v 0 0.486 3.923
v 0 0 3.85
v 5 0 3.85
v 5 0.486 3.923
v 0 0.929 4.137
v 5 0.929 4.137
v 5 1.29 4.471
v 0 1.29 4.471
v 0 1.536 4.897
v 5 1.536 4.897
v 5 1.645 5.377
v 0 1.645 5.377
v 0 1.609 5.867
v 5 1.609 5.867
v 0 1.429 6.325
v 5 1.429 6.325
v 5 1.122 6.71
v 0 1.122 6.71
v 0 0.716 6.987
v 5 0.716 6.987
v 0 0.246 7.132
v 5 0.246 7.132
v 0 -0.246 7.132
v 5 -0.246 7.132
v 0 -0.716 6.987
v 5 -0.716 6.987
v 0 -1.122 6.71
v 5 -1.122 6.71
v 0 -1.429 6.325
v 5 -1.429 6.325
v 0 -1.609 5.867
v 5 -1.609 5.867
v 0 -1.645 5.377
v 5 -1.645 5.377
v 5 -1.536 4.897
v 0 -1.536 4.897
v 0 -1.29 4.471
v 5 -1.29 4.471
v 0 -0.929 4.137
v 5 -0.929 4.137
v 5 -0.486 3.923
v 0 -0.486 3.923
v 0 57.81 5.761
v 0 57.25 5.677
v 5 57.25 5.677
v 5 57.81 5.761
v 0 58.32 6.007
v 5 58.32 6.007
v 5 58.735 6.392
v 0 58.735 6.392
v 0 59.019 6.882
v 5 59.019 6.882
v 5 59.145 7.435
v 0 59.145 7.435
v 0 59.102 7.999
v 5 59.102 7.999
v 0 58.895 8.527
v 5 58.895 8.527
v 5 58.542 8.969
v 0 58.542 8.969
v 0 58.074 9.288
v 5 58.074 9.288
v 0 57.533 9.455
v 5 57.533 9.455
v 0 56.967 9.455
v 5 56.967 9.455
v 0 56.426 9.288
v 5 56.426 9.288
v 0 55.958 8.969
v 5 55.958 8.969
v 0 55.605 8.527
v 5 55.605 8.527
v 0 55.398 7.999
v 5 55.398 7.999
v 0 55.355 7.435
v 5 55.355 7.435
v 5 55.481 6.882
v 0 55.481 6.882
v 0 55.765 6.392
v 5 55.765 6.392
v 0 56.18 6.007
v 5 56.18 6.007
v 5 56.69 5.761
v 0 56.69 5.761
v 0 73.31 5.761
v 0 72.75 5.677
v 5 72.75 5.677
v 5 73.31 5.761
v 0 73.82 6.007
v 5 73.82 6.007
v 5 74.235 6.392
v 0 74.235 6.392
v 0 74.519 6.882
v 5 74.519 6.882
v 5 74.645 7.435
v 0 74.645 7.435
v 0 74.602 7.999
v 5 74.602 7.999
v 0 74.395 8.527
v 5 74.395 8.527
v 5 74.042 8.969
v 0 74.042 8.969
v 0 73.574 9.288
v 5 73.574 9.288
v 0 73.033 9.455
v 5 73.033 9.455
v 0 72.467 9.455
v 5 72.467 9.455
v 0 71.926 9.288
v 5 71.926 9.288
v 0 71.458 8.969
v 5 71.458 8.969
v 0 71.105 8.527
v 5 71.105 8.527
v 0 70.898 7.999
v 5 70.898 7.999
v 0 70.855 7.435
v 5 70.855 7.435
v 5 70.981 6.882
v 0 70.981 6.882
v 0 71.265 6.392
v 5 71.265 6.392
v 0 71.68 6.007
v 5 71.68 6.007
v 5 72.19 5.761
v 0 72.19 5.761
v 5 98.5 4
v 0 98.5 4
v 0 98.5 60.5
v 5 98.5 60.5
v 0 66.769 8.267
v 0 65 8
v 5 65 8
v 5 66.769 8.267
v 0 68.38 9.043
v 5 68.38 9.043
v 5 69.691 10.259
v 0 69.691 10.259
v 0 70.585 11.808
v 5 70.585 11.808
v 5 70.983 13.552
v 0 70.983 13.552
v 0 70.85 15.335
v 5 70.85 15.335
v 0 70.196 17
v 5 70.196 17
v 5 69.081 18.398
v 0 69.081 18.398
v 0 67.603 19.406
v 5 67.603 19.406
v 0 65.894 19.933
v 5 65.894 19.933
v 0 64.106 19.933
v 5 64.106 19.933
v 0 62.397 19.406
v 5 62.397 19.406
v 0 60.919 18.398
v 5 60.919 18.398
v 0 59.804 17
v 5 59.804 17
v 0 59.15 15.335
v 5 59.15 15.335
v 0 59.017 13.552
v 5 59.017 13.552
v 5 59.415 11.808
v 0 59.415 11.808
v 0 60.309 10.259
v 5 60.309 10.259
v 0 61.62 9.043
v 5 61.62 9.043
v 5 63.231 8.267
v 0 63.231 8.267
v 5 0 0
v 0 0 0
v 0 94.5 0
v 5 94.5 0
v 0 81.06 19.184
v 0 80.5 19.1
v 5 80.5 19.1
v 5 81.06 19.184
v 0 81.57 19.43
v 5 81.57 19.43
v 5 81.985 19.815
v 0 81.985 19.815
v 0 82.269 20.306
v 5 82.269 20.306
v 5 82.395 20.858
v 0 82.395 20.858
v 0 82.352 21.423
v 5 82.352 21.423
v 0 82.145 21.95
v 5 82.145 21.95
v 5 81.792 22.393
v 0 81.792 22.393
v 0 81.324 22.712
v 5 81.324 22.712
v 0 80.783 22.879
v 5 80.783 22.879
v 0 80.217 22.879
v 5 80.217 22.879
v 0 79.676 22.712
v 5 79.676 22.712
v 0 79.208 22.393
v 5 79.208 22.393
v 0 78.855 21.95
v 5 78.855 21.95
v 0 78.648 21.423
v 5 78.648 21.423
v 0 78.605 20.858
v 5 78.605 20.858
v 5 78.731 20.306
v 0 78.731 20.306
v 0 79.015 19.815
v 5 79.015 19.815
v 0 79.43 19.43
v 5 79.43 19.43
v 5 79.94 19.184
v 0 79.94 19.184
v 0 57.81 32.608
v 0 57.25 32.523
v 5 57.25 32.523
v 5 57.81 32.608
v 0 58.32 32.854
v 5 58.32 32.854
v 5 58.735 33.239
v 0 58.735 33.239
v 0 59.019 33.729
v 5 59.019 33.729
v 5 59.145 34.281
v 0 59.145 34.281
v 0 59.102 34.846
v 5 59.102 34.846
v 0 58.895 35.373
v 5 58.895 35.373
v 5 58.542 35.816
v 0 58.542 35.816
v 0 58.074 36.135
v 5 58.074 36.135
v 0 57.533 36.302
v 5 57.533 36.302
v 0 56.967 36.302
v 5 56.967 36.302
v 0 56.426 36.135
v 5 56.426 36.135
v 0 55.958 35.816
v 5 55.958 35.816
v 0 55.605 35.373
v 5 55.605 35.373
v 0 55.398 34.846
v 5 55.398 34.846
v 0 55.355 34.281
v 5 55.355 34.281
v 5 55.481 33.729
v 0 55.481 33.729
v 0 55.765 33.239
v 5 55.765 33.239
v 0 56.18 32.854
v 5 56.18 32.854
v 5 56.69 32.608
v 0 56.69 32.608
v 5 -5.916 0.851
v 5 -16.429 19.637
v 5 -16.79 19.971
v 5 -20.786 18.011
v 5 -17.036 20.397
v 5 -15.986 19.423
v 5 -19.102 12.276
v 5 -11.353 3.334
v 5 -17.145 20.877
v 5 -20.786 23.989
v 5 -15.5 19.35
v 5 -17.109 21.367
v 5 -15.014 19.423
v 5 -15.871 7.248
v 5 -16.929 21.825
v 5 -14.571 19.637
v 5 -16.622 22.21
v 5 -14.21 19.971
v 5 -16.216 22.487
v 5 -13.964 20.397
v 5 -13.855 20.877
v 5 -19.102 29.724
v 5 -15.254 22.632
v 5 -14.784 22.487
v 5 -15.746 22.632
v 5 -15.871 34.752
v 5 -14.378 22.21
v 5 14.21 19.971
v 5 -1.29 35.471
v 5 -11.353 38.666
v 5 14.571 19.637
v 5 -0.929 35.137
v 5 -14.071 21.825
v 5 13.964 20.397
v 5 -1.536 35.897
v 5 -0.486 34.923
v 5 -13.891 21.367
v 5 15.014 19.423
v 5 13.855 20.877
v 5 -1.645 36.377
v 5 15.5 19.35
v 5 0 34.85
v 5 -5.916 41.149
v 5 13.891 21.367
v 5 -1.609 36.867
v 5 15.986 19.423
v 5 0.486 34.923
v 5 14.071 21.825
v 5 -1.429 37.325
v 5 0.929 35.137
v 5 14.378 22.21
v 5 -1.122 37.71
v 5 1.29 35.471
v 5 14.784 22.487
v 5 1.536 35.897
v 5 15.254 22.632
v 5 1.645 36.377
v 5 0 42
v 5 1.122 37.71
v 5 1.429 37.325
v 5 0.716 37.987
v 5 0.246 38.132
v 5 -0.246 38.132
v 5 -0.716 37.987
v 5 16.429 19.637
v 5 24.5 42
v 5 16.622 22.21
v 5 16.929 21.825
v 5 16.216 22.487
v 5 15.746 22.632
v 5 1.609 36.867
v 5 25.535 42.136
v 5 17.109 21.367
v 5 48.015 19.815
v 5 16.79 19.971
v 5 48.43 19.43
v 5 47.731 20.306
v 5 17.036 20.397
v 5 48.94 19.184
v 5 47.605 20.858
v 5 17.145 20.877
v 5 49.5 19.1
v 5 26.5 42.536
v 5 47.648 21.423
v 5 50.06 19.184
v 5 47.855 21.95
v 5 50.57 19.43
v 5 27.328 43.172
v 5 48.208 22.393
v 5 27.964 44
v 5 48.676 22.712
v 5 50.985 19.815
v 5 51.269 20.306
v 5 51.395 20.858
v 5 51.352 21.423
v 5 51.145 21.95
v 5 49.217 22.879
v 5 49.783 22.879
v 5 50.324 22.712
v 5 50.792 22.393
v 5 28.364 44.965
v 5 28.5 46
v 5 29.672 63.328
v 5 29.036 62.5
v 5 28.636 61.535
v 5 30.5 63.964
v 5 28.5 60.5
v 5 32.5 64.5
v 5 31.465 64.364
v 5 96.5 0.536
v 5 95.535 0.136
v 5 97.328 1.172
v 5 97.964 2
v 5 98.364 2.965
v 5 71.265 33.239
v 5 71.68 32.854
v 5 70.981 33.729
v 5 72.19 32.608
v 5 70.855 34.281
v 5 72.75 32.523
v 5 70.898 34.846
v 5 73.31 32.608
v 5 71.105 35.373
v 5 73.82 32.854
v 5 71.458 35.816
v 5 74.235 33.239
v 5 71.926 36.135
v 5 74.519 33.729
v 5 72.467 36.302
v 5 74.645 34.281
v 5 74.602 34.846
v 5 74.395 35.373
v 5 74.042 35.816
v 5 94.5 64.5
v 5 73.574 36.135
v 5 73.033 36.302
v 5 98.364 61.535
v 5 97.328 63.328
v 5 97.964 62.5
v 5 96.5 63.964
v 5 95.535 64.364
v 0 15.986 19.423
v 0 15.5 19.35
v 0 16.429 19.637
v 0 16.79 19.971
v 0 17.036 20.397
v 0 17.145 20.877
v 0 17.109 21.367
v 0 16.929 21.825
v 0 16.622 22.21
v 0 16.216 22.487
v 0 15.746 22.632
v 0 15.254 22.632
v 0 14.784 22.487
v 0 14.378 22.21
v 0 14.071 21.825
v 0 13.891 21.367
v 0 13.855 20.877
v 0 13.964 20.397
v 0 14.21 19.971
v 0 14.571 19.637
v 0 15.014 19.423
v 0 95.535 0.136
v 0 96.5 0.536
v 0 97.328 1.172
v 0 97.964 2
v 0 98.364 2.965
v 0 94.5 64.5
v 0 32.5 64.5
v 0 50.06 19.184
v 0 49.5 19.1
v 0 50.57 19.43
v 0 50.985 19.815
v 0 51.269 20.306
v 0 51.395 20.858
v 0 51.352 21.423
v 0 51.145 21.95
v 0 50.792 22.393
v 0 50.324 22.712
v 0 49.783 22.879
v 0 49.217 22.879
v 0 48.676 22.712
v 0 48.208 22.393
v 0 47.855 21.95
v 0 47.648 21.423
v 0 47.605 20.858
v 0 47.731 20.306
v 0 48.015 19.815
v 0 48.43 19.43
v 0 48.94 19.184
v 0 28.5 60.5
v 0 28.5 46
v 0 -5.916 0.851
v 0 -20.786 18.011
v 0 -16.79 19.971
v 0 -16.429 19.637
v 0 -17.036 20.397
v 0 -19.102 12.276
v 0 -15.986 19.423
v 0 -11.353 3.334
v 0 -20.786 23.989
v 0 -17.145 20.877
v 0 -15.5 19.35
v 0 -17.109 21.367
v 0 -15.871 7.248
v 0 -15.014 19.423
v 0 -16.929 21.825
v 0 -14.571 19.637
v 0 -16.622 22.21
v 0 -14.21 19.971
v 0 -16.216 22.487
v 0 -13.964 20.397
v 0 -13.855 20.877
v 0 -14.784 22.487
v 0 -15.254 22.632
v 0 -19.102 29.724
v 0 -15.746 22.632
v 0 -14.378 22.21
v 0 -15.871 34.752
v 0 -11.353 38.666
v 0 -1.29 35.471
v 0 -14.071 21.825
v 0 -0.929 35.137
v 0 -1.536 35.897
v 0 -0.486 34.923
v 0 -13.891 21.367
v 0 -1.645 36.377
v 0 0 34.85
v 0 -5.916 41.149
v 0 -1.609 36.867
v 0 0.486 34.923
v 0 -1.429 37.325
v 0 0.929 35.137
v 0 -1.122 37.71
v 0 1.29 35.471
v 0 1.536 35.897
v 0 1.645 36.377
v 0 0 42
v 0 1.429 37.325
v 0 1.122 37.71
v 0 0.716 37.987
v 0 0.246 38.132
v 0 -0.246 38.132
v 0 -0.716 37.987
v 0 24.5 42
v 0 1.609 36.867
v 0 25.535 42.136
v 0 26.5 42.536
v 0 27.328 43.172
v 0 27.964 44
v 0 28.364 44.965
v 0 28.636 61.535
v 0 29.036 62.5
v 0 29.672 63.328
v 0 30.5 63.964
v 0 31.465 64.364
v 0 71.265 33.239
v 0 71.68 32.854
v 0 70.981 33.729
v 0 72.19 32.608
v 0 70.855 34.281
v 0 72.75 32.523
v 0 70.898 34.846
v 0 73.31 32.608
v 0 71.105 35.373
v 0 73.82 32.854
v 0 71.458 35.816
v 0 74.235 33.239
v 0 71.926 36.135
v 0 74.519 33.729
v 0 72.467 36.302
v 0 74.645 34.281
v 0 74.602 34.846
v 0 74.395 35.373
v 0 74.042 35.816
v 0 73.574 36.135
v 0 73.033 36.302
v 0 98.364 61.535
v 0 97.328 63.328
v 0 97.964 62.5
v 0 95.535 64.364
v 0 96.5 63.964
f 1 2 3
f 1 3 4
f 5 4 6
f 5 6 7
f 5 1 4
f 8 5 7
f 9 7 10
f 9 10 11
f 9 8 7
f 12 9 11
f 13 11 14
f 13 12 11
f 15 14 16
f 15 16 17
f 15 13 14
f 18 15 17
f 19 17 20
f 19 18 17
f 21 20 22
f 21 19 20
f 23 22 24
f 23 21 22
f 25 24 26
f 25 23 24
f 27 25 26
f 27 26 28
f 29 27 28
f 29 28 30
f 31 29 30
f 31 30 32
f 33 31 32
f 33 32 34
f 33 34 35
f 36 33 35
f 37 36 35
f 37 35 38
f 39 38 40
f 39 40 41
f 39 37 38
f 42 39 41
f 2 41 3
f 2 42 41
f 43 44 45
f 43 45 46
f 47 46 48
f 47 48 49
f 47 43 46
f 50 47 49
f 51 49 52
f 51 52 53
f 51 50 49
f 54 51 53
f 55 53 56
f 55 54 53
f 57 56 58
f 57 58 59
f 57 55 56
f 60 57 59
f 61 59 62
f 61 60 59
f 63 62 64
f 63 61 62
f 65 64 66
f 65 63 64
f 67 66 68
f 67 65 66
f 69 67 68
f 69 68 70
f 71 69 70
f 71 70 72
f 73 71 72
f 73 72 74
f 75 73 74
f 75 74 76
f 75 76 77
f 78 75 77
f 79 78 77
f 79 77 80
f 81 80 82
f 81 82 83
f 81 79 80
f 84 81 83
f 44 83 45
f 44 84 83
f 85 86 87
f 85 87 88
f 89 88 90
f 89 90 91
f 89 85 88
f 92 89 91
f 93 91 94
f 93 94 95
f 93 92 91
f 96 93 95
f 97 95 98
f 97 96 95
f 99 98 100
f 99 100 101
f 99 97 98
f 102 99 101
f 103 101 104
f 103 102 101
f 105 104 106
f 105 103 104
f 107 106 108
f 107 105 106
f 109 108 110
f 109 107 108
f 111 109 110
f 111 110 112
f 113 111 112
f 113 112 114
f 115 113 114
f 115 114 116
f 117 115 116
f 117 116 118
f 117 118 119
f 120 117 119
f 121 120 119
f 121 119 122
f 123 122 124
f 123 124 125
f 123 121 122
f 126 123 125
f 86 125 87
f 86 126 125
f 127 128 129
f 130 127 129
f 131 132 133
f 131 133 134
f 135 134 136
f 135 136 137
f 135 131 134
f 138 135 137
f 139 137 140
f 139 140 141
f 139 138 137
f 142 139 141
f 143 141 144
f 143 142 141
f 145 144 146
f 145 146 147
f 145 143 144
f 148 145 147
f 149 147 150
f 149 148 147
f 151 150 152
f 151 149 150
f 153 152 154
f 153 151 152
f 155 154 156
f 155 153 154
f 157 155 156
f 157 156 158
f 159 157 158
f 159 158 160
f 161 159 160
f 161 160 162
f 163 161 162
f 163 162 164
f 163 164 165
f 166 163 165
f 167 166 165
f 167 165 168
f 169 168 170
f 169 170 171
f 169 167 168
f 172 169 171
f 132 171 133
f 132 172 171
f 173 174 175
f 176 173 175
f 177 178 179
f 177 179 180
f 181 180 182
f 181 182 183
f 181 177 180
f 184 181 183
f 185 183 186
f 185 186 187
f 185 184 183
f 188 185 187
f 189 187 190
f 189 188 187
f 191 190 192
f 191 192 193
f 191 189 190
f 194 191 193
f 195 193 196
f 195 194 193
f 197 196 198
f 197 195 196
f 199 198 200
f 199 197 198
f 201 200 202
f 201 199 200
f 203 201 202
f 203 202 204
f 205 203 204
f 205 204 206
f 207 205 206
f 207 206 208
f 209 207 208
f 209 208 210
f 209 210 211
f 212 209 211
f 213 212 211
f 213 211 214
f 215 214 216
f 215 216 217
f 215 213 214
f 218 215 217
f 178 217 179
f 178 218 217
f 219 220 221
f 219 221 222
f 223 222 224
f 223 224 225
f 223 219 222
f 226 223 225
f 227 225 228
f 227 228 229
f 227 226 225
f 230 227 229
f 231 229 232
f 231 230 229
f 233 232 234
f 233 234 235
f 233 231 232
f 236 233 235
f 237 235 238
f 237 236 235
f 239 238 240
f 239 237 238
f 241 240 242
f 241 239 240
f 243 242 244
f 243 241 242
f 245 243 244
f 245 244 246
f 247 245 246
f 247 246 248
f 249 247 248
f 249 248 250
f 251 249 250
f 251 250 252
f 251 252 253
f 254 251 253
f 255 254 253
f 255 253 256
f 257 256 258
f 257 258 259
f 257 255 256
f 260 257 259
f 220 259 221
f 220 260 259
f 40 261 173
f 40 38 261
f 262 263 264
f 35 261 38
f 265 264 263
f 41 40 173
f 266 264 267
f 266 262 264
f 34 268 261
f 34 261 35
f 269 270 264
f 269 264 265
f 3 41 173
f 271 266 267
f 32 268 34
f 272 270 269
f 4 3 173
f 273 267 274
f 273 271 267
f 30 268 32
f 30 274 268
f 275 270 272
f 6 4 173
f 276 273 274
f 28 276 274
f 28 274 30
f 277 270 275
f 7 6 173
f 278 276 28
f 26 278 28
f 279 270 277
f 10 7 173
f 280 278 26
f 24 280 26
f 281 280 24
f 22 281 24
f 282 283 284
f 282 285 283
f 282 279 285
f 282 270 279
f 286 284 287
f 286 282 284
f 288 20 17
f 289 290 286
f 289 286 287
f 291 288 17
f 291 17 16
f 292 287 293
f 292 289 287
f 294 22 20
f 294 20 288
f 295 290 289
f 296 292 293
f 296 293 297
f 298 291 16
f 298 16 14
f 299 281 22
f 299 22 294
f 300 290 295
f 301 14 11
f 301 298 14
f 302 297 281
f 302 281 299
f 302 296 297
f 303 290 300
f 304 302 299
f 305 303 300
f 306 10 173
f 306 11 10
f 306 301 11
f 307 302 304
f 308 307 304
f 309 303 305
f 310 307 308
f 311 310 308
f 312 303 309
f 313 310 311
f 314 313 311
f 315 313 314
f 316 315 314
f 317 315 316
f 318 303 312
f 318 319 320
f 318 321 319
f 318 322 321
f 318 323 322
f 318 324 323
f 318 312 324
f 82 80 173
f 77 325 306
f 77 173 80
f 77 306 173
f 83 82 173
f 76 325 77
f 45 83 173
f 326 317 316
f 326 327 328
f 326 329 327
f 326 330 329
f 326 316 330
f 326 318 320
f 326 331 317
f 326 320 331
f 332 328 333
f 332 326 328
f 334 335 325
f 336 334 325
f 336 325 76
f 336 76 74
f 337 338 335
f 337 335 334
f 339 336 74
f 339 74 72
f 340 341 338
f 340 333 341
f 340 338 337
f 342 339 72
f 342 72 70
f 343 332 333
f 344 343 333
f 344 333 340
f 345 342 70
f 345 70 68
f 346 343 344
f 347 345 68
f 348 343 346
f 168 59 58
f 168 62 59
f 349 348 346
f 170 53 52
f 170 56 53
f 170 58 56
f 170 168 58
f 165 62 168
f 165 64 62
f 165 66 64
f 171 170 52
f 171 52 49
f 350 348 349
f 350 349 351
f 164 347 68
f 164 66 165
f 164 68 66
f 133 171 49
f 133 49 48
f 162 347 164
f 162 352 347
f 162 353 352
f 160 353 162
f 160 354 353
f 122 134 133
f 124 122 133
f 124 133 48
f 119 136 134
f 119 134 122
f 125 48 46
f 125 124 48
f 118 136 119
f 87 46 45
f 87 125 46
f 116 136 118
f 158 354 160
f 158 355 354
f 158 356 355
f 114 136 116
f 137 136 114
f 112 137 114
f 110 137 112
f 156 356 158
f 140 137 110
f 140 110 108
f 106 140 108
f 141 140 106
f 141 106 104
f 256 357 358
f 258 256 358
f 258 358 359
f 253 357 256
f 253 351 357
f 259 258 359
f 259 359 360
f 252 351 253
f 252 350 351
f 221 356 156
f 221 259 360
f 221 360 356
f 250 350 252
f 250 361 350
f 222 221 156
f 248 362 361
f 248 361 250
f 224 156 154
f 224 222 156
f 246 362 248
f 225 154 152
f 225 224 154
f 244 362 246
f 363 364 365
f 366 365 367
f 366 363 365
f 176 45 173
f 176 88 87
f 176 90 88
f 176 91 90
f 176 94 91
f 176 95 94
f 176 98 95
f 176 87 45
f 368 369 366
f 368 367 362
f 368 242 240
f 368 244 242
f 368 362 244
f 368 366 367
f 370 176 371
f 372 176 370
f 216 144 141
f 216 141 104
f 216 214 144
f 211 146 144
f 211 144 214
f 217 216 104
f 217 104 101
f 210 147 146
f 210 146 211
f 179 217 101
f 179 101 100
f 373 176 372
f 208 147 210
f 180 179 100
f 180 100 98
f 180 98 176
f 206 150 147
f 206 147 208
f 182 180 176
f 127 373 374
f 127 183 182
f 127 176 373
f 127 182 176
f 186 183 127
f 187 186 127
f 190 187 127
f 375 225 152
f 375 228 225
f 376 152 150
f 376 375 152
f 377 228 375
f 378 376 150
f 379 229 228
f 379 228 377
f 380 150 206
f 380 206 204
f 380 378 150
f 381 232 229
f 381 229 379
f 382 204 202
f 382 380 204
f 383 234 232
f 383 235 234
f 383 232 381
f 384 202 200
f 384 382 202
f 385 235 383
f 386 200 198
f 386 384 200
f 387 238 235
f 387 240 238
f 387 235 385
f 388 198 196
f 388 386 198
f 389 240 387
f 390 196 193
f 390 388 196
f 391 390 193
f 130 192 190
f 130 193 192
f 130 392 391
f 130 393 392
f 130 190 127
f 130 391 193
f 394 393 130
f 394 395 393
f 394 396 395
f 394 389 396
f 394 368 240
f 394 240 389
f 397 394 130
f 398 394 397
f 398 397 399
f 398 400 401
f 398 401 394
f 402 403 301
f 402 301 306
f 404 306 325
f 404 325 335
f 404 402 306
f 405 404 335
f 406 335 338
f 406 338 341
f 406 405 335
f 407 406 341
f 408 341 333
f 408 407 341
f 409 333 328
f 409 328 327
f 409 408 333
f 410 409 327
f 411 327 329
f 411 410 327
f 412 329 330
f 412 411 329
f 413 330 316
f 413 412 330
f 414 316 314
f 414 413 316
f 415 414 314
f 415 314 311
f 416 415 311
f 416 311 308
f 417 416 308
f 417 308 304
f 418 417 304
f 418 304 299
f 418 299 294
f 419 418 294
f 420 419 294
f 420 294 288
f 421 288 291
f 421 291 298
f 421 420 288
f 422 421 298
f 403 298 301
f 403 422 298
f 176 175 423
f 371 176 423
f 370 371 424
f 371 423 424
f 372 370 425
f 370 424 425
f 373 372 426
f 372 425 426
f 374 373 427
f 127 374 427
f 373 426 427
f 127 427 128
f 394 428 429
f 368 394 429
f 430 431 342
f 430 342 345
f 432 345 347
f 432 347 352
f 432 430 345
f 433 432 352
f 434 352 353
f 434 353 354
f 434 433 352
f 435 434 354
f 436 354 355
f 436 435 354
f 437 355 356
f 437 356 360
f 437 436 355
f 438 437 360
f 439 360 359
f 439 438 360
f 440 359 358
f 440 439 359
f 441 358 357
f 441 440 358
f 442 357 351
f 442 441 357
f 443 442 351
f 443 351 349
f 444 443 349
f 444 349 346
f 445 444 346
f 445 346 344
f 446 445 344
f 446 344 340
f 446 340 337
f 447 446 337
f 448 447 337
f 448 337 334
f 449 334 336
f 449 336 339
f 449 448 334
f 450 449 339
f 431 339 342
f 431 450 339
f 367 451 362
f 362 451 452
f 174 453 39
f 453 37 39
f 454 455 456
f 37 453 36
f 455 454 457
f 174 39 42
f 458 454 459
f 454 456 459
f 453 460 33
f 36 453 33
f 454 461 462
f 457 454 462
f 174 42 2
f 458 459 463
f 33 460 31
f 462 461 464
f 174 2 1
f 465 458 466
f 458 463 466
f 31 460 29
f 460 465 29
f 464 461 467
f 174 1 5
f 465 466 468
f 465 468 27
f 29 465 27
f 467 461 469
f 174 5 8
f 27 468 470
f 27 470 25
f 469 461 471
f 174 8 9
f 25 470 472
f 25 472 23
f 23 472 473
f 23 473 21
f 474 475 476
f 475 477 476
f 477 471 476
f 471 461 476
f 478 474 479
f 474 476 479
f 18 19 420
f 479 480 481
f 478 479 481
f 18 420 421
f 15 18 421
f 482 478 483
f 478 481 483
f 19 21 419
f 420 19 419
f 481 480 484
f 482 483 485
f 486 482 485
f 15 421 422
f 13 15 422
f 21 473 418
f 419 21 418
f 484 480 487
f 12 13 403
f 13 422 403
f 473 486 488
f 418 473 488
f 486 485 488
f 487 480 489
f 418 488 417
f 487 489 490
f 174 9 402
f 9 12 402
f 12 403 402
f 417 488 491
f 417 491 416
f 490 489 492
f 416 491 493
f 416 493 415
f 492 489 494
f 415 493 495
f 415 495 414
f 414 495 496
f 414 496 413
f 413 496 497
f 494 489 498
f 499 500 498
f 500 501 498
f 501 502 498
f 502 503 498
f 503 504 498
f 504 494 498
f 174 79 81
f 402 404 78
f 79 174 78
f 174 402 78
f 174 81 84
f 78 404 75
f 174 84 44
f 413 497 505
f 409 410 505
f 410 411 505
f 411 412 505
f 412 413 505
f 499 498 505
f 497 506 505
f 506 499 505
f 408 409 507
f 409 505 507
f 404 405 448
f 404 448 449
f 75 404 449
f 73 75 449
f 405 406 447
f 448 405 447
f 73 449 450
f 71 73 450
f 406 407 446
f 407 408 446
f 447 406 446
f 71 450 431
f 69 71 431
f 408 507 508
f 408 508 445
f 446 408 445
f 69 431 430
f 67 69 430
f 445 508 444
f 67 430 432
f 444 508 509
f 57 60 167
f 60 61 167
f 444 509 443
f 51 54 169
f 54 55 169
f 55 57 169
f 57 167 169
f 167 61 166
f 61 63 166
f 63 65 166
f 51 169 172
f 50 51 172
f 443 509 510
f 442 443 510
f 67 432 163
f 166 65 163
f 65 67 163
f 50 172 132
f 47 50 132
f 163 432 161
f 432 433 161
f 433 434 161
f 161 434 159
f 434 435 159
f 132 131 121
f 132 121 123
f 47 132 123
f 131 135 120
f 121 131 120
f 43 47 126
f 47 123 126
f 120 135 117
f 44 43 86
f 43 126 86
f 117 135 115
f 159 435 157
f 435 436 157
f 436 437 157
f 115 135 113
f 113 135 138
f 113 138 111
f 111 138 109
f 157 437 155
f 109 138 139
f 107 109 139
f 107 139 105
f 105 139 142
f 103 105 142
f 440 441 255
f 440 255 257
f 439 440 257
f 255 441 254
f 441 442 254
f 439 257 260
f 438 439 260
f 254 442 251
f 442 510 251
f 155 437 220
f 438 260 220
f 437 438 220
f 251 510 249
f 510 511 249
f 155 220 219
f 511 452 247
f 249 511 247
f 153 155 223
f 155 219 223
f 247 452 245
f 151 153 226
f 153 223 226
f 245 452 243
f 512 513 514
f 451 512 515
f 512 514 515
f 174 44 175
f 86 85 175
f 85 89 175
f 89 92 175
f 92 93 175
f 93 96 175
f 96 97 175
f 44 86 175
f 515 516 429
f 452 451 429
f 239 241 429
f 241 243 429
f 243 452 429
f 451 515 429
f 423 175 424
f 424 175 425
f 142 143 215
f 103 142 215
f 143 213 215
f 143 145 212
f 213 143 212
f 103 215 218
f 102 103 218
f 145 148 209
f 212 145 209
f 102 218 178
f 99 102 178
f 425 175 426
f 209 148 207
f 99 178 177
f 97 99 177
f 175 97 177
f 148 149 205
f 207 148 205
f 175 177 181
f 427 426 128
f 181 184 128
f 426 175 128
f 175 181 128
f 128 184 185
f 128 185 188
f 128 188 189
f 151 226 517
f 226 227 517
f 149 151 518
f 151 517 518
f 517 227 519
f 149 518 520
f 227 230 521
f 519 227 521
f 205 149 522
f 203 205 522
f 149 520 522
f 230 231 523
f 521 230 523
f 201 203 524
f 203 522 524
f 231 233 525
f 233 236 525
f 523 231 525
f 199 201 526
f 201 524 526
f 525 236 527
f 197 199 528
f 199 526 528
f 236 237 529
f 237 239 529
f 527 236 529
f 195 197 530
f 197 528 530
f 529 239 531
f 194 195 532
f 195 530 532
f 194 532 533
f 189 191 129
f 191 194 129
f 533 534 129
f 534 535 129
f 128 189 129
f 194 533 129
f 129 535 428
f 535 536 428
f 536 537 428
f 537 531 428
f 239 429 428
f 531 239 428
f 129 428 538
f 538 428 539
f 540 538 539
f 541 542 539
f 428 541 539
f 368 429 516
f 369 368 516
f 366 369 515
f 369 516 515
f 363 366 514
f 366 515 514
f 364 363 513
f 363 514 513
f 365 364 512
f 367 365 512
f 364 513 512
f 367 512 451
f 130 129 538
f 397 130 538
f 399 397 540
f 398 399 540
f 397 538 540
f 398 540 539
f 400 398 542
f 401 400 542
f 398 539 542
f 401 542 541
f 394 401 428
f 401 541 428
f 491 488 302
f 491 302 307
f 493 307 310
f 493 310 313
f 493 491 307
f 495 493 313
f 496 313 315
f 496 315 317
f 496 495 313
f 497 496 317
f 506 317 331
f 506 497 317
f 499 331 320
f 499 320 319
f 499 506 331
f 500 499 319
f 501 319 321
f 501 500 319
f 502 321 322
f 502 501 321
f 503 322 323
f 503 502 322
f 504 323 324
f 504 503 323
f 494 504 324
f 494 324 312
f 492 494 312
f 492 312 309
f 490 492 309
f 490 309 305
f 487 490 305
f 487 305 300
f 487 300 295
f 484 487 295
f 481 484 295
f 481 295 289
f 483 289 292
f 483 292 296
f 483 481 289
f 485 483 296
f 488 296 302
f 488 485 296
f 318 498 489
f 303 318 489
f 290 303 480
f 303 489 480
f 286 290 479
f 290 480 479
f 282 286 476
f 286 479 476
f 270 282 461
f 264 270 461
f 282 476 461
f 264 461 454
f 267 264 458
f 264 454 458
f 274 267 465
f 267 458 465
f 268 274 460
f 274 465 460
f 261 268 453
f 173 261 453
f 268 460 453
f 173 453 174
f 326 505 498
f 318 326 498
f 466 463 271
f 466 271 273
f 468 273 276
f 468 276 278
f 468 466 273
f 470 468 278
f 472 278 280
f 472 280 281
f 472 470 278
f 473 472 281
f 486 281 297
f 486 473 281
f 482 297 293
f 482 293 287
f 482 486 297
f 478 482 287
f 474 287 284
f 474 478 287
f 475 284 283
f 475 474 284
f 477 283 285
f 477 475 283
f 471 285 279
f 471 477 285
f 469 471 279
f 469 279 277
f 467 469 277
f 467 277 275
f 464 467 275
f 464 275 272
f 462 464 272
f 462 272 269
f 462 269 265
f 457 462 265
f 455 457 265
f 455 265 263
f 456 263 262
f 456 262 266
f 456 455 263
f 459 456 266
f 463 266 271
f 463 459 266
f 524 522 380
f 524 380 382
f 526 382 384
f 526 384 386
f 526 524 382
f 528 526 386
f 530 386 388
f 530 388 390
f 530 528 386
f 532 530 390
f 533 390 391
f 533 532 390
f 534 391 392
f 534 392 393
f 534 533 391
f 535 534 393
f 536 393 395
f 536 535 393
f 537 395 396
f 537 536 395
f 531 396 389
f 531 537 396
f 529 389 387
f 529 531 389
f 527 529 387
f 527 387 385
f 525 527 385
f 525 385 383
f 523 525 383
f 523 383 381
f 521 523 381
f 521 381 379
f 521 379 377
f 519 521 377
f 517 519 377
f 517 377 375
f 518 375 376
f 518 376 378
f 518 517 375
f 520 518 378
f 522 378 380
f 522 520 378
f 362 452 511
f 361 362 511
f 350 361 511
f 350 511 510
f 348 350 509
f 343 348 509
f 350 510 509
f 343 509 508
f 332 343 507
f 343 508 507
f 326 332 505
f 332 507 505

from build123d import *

# Parameters (mm, degrees)
SKETCH1_R           = 1.65
SKETCH1_R_2         = 1.9
SKETCH1_R_3         = 6
BOSS_EXTRUDE1_DEPTH = 5


with BuildPart() as part:
    # Sketch1 → Boss-Extrude1 (new body)
    with BuildSketch(Plane.YZ):
        with BuildLine():
            Line((0, 0), (94.5, 0))
            ThreePointArc((94.5, 0), (97.328427125, 1.171572875), (98.5, 4))
            Line((98.5, 4), (98.5, 60.5))
            ThreePointArc((98.5, 60.5), (97.328427125, 63.328427125), (94.5, 64.5))
            Line((94.5, 64.5), (32.5, 64.5))
            ThreePointArc((32.5, 64.5), (29.671572875, 63.328427125), (28.5, 60.5))
            Line((28.5, 60.5), (28.5, 46))
            ThreePointArc((28.5, 46), (27.328427125, 43.171572875), (24.5, 42))
            Line((24.5, 42), (0, 42))
            ThreePointArc((0, 42), (-21, 21), (0, 0))
        make_face()
        with Locations(Location((-15.5, 21, 0), (0, 0, 270))):
            Circle(SKETCH1_R, mode=Mode.SUBTRACT)
        with Locations(Location((49.5, 21, 0), (0, 0, 270))):
            Circle(SKETCH1_R_2, mode=Mode.SUBTRACT)
        with Locations(Location((65, 14, 0), (0, 0, 270))):
            Circle(SKETCH1_R_3, mode=Mode.SUBTRACT)
        with Locations(Location((57.25, 34.423393759, 0), (0, 0, 270))):
            Circle(SKETCH1_R_2, mode=Mode.SUBTRACT)
        with Locations(Location((72.75, 34.423393759, 0), (0, 0, 270))):
            Circle(SKETCH1_R_2, mode=Mode.SUBTRACT)
        with Locations(Location((80.5, 21, 0), (0, 0, 270))):
            Circle(SKETCH1_R_2, mode=Mode.SUBTRACT)
        with Locations(Location((72.75, 7.576606241, 0), (0, 0, 270))):
            Circle(SKETCH1_R_2, mode=Mode.SUBTRACT)
        with Locations(Location((57.25, 7.576606241, 0), (0, 0, 270))):
            Circle(SKETCH1_R_2, mode=Mode.SUBTRACT)
        with Locations(Location((0, 36.5, 0), (0, 0, 270))):
            Circle(SKETCH1_R, mode=Mode.SUBTRACT)
        with Locations(Location((15.5, 21, 0), (0, 0, 270))):
            Circle(SKETCH1_R, mode=Mode.SUBTRACT)
        with Locations(Location((0, 5.5, 0), (0, 0, 270))):
            Circle(SKETCH1_R, mode=Mode.SUBTRACT)
    extrude(amount=BOSS_EXTRUDE1_DEPTH)


solid = part.part
